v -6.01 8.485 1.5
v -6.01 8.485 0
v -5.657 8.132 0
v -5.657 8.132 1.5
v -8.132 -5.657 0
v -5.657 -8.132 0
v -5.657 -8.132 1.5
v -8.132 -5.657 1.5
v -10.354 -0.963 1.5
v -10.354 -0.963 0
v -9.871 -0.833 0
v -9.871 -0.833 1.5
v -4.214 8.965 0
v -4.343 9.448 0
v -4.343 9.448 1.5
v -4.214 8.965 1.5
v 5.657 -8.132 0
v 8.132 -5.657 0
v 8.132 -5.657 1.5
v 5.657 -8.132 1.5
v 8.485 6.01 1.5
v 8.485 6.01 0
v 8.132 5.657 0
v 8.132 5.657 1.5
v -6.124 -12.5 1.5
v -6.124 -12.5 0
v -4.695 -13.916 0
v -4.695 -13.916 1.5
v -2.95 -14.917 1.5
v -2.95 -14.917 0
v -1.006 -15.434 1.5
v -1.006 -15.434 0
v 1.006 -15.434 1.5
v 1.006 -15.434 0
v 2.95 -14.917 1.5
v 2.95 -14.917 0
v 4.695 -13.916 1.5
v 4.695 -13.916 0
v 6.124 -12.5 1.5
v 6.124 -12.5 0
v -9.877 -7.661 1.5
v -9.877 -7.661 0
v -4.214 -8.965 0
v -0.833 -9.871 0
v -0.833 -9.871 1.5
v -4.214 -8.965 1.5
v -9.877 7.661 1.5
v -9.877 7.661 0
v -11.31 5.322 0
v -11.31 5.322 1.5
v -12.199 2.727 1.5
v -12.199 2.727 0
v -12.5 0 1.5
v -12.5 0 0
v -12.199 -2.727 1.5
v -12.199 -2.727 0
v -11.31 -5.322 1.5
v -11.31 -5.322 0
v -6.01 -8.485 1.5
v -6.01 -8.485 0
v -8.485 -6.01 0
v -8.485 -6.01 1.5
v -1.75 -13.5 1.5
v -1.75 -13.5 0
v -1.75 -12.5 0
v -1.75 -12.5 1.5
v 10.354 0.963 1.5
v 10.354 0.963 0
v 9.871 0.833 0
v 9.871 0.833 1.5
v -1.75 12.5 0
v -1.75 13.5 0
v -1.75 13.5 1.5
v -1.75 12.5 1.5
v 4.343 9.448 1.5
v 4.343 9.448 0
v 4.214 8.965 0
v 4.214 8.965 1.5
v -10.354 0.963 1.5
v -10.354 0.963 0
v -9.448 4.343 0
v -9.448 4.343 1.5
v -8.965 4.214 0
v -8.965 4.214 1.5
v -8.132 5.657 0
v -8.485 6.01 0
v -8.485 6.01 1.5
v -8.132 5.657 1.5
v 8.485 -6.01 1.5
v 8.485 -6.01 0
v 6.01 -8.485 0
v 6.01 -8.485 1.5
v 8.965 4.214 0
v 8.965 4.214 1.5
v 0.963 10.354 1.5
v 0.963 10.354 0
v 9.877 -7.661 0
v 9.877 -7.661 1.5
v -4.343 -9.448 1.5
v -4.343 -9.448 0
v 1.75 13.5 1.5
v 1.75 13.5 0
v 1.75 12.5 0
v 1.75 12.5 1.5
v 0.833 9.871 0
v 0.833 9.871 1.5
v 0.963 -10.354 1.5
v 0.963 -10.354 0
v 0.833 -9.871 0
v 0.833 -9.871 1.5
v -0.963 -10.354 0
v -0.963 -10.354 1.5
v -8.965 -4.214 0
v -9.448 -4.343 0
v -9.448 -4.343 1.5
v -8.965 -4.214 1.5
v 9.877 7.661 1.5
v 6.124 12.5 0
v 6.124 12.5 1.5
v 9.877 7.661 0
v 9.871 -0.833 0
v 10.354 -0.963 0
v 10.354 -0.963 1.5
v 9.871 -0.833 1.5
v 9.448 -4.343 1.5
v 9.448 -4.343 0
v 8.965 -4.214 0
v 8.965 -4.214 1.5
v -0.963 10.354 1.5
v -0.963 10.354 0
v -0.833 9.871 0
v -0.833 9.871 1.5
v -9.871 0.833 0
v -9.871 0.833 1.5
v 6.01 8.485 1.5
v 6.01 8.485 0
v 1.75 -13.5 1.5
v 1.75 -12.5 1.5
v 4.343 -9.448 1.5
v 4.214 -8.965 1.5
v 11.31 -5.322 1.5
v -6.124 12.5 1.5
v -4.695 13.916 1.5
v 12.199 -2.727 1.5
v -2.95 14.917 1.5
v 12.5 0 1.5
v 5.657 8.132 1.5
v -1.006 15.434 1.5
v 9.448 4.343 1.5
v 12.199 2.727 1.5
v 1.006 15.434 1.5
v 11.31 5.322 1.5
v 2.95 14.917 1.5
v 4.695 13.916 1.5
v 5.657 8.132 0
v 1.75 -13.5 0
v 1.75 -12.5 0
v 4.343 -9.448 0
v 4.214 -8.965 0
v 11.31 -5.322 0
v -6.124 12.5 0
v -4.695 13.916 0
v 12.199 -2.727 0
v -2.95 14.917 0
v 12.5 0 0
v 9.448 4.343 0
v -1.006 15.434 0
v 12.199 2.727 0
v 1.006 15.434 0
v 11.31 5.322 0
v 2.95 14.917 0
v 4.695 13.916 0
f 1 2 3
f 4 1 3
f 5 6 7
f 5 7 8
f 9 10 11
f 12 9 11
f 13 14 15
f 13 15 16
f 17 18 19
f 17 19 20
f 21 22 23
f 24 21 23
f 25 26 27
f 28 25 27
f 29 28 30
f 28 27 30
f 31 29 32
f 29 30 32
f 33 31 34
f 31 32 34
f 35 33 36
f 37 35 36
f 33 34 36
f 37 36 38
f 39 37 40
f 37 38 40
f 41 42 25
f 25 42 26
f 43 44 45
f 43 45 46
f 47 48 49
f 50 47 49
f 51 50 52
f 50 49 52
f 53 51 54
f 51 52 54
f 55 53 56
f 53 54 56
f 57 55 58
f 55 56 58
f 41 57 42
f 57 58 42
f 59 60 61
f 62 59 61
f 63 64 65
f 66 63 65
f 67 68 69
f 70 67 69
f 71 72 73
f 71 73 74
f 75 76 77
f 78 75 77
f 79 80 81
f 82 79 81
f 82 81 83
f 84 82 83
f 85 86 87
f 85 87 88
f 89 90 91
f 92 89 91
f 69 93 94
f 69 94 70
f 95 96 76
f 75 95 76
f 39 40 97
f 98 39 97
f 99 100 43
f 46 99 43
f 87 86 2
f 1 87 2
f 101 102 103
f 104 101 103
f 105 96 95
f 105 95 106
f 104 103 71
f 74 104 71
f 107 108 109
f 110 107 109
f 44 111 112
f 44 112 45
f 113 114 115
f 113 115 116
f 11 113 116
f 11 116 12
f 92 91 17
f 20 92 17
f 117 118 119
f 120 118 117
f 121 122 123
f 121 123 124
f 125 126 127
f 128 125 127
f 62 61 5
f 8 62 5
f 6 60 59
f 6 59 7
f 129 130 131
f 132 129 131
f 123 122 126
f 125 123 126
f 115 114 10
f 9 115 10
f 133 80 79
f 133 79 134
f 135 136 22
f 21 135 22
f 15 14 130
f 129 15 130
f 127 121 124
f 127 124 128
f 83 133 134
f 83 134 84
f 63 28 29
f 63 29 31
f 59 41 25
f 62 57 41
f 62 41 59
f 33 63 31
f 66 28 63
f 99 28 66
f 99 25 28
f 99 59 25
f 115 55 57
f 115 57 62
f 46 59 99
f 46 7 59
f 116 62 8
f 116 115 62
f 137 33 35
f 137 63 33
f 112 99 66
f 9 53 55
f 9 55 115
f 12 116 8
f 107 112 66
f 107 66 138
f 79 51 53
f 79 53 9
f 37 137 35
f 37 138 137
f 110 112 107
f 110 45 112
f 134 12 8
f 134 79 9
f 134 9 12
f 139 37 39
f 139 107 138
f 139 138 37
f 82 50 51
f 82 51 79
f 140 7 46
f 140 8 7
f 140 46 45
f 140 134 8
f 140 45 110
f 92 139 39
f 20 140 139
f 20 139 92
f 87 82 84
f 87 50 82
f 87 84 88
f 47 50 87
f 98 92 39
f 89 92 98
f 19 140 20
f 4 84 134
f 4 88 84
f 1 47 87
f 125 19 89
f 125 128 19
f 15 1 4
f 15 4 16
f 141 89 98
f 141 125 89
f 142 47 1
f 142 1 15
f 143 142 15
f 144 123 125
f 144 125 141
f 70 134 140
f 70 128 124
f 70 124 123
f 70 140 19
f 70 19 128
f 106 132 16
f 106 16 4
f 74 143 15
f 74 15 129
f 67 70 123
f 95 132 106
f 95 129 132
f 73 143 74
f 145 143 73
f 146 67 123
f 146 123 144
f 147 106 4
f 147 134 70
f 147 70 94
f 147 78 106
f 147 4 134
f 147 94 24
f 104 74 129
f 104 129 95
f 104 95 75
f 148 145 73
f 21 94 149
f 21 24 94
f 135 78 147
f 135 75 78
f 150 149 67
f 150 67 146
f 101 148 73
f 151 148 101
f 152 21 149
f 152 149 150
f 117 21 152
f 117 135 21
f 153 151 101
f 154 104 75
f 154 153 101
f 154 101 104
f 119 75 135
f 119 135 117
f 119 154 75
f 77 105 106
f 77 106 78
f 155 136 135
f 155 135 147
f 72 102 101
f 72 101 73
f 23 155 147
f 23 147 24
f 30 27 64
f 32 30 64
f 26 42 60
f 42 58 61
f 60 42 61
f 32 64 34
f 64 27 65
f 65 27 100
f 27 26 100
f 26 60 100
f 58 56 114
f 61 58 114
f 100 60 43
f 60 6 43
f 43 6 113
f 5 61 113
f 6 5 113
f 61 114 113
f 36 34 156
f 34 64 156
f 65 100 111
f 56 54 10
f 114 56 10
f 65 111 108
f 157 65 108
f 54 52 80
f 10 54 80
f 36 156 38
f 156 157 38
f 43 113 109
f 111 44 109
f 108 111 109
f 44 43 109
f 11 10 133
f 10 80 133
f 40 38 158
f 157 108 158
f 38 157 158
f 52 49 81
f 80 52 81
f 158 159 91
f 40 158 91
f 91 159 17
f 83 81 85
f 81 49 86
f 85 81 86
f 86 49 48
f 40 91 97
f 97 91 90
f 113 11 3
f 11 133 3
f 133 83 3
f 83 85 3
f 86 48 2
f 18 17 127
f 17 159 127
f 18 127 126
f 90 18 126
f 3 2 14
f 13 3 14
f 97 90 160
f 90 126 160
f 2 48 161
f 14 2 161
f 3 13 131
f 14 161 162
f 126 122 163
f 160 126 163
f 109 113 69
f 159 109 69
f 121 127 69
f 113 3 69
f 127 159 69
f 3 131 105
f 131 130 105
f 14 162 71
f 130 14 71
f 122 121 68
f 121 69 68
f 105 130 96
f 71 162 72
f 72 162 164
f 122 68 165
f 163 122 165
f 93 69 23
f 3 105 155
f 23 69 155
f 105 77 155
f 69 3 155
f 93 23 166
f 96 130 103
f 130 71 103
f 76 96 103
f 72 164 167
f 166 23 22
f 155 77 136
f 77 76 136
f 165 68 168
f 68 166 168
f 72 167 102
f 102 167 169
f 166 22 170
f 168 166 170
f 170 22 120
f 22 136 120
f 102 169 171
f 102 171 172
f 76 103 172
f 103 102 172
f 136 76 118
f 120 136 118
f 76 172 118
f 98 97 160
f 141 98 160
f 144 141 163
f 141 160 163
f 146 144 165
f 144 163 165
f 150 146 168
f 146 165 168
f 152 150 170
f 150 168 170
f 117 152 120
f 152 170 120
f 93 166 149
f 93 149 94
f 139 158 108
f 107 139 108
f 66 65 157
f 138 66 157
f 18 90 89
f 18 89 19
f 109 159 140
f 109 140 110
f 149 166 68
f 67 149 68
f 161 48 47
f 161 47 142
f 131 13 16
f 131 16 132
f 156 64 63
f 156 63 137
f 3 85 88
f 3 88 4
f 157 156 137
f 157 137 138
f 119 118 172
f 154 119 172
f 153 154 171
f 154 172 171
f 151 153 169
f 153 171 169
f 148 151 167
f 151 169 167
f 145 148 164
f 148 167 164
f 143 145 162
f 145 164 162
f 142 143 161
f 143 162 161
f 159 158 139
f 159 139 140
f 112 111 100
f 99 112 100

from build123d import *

# Parameters (mm, degrees)
PAD_DEPTH             = 1.5
SKETCH006_W           = 3.5
SKETCH006_H           = 1
POCKET_DEPTH          = 81.206709
POLARPATTERN_COUNT    = 2
SKETCH014_W           = 0.5
SKETCH014_H           = 3.5
POCKET004_DEPTH       = 81.206709
POLARPATTERN003_COUNT = 12


with BuildPart() as part:
    # Sketch → Pad (new body)
    with BuildSketch(Plane.XY):
        with BuildLine():
            ThreePointArc((-9.876975, 7.66129), (-12.5, 0), (-9.876975, -7.66129))
            Line((-9.876975, -7.66129), (-6.123724, -12.5))
            ThreePointArc((-6.123724, -12.5), (0, -15.5), (6.123724, -12.5))
            Line((6.123724, -12.5), (9.876996, -7.661263))
            ThreePointArc((9.876996, -7.661263), (12.5, 0), (9.876996, 7.661263))
            Line((6.123742, 12.499977), (9.876996, 7.661263))
            ThreePointArc((6.123742, 12.499977), (1.7e-05, 15.5), (-6.123722, 12.500003))
            Line((-9.876975, 7.66129), (-6.123722, 12.500003))
        make_face()
    extrude(amount=PAD_DEPTH)

    # Sketch006 → Pocket (cut, through all)
    with BuildSketch(Plane.XY):
        with Locations((0, -13)):
            Rectangle(SKETCH006_W, SKETCH006_H)
    pocket = extrude(amount=POCKET_DEPTH, mode=Mode.SUBTRACT)

    # PolarPattern: Pocket ×2 about axis
    polarpattern_axis = Axis((0, 0, 0), (0, 0, 1))
    for i in range(1, POLARPATTERN_COUNT):
        add(pocket.rotate(polarpattern_axis, i * 360 / POLARPATTERN_COUNT), mode=Mode.SUBTRACT)

    # Sketch014 → Pocket004 (cut, through all)
    with BuildSketch(Plane(origin=(0, 0, 0), x_dir=(0.965926, 0.258819, 0), z_dir=(0, 0, 1))):
        with Locations((-10, 0)):
            Rectangle(SKETCH014_W, SKETCH014_H)
    pocket004 = extrude(amount=POCKET004_DEPTH, mode=Mode.SUBTRACT)

    # PolarPattern003: Pocket004 ×12 about axis
    polarpattern003_axis = Axis((0, 0, 0), (0, 0, 1))
    for i in range(1, POLARPATTERN003_COUNT):
        add(pocket004.rotate(polarpattern003_axis, i * 360 / POLARPATTERN003_COUNT), mode=Mode.SUBTRACT)


solid = part.part
